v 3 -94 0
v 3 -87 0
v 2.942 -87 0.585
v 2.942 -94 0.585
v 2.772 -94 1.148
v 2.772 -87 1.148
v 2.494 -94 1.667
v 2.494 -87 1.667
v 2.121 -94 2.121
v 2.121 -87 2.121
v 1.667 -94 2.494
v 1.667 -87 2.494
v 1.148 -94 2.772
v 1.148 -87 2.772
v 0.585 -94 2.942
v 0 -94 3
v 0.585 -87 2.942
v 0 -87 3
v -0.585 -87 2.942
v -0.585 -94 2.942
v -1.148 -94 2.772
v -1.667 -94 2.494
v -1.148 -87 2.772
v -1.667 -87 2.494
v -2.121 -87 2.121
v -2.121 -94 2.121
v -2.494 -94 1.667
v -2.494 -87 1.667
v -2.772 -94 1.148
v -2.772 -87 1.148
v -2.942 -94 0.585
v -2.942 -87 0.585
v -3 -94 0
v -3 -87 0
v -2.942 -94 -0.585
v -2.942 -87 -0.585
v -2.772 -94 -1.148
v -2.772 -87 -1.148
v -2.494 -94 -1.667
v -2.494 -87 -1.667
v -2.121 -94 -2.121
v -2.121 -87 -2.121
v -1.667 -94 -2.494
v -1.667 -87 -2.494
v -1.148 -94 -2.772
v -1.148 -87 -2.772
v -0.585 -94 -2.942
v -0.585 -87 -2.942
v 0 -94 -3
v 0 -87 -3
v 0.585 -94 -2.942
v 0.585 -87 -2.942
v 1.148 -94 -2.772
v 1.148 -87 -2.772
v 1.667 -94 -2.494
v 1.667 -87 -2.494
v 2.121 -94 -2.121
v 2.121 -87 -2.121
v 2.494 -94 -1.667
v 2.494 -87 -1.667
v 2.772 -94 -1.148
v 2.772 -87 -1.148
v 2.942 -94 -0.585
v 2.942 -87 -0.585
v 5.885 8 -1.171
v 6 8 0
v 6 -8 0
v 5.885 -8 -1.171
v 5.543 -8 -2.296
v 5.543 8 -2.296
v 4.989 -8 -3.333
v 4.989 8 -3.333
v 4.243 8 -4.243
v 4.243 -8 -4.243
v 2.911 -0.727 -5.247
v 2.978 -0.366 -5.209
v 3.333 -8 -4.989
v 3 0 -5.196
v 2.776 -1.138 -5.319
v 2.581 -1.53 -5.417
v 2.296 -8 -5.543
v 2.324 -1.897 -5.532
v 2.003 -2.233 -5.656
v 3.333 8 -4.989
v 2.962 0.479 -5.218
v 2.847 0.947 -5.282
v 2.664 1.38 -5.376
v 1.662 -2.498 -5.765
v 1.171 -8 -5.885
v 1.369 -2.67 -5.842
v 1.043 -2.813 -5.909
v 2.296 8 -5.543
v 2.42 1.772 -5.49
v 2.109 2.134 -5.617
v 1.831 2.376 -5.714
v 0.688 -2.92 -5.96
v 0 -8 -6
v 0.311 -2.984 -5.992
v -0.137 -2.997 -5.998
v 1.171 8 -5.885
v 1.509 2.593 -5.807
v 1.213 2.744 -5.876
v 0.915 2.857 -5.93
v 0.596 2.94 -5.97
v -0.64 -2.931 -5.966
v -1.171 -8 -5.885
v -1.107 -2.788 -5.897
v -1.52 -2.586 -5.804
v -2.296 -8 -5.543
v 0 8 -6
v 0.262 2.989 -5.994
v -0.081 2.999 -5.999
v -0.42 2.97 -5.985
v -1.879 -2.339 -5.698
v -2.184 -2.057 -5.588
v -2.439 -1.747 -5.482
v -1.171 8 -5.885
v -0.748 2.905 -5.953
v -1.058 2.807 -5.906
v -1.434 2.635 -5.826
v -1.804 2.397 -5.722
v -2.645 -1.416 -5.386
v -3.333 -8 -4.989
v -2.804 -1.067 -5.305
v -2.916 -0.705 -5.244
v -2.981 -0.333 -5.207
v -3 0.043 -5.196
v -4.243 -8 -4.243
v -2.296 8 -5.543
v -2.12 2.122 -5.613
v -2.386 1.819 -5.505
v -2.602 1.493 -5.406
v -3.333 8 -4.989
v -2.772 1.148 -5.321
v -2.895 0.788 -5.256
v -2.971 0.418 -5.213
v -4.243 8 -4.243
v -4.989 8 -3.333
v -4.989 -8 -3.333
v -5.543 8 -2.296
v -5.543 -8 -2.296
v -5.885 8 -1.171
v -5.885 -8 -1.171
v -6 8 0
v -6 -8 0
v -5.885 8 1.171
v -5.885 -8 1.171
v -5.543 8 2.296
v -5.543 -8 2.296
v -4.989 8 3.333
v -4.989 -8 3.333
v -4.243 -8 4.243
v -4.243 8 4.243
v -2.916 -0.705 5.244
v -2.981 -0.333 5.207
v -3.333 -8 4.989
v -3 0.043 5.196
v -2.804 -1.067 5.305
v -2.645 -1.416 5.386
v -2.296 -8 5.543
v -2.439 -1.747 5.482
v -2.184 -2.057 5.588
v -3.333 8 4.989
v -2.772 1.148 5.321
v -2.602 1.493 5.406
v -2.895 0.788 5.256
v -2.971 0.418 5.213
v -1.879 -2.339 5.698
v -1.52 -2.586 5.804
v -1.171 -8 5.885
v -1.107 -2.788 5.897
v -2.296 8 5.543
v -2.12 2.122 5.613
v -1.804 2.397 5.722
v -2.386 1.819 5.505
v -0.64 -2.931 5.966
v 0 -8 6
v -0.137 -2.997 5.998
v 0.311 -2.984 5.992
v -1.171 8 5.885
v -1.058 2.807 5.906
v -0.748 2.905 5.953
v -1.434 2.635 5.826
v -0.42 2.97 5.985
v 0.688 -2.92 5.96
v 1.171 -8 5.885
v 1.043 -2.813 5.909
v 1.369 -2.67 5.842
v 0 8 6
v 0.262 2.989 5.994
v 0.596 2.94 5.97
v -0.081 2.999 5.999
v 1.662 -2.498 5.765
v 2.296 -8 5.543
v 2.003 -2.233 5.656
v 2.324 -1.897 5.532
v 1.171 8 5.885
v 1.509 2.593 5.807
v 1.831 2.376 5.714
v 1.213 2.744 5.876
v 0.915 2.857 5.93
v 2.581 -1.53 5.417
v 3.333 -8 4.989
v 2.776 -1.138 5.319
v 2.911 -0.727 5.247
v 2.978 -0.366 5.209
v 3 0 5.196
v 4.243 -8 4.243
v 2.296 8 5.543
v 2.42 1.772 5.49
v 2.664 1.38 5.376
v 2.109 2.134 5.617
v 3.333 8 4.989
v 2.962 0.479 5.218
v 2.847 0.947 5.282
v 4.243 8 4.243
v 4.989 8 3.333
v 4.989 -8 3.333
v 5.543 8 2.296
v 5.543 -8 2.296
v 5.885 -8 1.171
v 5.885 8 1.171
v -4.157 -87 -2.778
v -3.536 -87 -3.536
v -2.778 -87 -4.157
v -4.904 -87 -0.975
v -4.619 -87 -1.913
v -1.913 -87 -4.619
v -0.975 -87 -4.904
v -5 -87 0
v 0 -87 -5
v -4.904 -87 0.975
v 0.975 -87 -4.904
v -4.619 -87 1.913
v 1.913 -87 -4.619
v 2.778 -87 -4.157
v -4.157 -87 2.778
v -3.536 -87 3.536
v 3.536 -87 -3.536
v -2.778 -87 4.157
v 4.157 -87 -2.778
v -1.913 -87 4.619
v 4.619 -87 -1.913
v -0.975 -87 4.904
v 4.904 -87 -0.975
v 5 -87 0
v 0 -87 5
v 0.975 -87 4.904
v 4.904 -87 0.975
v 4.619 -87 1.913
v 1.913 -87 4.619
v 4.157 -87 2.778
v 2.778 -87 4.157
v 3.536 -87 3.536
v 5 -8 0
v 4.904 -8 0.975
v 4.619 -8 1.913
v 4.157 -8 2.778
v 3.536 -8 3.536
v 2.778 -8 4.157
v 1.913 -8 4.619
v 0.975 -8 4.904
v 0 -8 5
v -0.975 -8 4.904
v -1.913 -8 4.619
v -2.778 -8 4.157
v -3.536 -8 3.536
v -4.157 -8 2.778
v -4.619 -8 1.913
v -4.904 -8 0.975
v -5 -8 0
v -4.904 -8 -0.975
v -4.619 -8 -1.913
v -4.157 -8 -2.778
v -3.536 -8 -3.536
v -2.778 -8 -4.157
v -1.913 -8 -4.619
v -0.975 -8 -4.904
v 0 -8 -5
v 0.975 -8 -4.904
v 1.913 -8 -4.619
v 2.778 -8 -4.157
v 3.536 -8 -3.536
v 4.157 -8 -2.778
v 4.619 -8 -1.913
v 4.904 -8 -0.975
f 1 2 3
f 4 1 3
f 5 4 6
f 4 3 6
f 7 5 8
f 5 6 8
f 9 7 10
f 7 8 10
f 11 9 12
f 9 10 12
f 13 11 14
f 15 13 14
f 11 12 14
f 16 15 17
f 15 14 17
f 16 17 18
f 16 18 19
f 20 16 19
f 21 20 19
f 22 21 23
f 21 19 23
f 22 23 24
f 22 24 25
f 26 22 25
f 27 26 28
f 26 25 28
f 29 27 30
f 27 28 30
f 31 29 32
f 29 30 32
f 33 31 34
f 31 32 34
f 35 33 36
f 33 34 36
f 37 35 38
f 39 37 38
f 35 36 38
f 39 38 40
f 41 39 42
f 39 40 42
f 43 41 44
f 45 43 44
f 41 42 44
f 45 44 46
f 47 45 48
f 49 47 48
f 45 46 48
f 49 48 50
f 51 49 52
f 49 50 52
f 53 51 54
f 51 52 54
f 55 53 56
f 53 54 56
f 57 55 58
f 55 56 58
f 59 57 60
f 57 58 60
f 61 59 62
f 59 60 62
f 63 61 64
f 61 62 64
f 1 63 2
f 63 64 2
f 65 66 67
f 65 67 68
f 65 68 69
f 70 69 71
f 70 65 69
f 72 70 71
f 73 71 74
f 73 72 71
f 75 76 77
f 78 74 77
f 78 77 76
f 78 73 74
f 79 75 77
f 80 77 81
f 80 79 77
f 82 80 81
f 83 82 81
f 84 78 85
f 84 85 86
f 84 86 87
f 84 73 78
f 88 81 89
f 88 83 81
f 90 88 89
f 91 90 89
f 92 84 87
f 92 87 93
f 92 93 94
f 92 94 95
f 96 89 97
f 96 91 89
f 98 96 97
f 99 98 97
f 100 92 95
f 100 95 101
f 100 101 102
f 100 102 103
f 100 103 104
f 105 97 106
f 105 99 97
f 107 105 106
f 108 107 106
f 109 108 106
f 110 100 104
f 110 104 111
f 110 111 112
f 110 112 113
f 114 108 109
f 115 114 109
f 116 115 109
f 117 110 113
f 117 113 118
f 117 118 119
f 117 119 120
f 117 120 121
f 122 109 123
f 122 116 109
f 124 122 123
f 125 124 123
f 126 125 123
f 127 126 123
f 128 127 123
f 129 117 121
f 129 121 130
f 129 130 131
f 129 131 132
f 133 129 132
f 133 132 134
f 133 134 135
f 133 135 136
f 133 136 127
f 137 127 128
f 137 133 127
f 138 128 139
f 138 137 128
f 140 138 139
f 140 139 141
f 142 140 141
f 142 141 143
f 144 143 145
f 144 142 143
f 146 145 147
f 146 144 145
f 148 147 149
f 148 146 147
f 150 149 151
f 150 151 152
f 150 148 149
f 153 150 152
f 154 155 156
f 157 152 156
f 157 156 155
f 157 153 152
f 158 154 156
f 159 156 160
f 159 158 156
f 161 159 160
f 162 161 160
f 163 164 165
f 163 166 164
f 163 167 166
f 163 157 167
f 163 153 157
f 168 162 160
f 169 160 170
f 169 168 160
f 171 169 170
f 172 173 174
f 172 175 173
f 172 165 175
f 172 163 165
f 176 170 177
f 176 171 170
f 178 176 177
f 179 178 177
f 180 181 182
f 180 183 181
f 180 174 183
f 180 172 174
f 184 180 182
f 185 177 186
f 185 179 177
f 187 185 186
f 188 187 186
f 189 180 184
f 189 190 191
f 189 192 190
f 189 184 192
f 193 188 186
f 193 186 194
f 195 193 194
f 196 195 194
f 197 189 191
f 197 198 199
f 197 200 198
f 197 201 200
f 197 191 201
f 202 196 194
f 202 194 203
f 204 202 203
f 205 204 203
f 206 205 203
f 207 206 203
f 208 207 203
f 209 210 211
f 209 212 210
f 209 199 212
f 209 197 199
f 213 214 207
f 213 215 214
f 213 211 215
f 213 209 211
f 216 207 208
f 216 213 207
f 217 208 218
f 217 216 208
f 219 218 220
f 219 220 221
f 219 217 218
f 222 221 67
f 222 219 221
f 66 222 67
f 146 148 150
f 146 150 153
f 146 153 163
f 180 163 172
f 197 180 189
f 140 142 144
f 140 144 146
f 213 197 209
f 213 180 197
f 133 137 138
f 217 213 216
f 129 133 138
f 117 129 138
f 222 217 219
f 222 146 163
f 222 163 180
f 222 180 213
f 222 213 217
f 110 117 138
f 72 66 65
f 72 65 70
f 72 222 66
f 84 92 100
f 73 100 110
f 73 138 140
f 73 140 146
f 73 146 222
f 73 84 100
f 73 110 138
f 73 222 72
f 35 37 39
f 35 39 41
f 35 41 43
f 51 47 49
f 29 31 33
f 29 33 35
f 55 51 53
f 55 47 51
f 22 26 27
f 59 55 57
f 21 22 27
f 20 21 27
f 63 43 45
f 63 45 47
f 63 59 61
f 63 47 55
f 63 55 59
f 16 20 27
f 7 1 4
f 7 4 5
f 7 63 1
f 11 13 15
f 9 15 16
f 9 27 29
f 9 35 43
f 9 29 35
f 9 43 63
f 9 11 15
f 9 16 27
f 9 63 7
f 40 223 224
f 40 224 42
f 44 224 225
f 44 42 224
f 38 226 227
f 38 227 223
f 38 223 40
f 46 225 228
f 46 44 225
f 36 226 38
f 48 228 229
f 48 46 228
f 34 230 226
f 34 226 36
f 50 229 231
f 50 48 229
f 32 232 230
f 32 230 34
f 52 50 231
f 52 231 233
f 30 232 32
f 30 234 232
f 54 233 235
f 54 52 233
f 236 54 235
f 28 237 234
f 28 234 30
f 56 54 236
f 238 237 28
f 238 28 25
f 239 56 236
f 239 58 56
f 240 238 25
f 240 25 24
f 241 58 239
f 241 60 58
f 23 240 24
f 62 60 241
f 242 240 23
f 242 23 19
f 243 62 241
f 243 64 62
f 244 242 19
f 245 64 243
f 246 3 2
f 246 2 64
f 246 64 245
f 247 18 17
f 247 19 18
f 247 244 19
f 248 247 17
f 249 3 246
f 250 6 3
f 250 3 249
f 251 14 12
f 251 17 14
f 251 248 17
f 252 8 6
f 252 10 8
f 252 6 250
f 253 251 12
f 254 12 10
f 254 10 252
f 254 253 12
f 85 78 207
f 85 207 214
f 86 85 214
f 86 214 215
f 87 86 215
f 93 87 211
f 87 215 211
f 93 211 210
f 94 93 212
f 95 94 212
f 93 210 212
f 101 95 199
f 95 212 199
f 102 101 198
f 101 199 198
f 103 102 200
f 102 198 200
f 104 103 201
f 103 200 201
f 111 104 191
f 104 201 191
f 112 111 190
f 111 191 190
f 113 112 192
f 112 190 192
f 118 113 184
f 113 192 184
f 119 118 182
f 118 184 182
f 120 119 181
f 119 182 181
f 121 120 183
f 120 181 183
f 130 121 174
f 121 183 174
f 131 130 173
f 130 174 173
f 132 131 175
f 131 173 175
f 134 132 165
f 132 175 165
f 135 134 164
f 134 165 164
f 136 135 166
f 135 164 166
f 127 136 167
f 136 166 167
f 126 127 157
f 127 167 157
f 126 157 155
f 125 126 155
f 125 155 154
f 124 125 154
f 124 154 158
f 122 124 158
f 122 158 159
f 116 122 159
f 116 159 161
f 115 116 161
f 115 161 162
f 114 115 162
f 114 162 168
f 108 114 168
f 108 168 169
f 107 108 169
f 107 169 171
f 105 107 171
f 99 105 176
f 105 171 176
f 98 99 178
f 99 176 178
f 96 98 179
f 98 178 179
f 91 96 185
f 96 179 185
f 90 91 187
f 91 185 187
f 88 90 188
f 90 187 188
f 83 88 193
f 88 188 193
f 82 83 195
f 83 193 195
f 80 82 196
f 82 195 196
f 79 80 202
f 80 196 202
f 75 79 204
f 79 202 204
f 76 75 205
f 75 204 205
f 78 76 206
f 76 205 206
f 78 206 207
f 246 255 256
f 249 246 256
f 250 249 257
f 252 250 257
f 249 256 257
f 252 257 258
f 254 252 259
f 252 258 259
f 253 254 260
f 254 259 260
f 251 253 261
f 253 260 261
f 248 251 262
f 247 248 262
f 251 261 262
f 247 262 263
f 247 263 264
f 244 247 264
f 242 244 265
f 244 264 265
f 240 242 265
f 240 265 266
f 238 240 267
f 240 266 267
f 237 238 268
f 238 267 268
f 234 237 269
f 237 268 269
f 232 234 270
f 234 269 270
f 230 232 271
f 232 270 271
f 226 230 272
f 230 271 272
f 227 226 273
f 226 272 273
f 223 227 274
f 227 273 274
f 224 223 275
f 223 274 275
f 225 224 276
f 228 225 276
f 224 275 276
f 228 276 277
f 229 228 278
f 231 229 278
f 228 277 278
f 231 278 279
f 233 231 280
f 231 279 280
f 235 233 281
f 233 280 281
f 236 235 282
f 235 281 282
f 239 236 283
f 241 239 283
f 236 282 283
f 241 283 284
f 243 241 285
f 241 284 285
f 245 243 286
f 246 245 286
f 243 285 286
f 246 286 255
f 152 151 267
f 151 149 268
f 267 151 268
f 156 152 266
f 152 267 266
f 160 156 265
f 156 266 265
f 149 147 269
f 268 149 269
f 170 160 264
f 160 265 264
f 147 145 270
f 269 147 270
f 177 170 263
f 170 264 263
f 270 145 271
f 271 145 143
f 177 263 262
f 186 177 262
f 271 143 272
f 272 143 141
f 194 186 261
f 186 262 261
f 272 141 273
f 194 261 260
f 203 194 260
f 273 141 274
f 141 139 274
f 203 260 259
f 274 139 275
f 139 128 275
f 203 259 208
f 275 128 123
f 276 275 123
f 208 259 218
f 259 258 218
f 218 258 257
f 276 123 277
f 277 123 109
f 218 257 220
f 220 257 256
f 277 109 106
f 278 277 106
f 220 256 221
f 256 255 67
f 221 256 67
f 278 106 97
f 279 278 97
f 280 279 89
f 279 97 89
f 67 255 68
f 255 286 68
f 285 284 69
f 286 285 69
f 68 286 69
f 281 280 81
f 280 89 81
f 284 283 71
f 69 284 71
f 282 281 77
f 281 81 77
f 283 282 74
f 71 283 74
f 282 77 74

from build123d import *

# Parameters (mm, degrees)
SKETCH1_R           = 6
BOSS_EXTRUDE1_DEPTH = 8
SKETCH2_R           = 5
BOSS_EXTRUDE2_DEPTH = 79
SKETCH3_R           = 3
BOSS_EXTRUDE3_DEPTH = 7
SKETCH4_R           = 3
CUT_EXTRUDE1_DEPTH  = 8.5


with BuildPart() as part:
    # Sketch1 → Boss-Extrude1 (new body, symmetric)
    with BuildSketch(Plane(origin=(0, 0, 0), x_dir=(1, 0, 0), z_dir=(0, 1, 0))):
        Circle(SKETCH1_R)
    extrude(amount=BOSS_EXTRUDE1_DEPTH, both=True)

    # Sketch2 → Boss-Extrude2 (add)
    with BuildSketch(Plane.XZ.offset(8)):
        Circle(SKETCH2_R)
    extrude(amount=BOSS_EXTRUDE2_DEPTH)

    # Sketch3 → Boss-Extrude3 (add)
    with BuildSketch(Plane.XZ.offset(87)):
        Circle(SKETCH3_R)
    extrude(amount=BOSS_EXTRUDE3_DEPTH)

    # Sketch4 → Cut-Extrude1 (cut, symmetric)
    with BuildSketch(Plane.XY):
        Circle(SKETCH4_R)
    extrude(amount=CUT_EXTRUDE1_DEPTH, both=True, mode=Mode.SUBTRACT)


solid = part.part
